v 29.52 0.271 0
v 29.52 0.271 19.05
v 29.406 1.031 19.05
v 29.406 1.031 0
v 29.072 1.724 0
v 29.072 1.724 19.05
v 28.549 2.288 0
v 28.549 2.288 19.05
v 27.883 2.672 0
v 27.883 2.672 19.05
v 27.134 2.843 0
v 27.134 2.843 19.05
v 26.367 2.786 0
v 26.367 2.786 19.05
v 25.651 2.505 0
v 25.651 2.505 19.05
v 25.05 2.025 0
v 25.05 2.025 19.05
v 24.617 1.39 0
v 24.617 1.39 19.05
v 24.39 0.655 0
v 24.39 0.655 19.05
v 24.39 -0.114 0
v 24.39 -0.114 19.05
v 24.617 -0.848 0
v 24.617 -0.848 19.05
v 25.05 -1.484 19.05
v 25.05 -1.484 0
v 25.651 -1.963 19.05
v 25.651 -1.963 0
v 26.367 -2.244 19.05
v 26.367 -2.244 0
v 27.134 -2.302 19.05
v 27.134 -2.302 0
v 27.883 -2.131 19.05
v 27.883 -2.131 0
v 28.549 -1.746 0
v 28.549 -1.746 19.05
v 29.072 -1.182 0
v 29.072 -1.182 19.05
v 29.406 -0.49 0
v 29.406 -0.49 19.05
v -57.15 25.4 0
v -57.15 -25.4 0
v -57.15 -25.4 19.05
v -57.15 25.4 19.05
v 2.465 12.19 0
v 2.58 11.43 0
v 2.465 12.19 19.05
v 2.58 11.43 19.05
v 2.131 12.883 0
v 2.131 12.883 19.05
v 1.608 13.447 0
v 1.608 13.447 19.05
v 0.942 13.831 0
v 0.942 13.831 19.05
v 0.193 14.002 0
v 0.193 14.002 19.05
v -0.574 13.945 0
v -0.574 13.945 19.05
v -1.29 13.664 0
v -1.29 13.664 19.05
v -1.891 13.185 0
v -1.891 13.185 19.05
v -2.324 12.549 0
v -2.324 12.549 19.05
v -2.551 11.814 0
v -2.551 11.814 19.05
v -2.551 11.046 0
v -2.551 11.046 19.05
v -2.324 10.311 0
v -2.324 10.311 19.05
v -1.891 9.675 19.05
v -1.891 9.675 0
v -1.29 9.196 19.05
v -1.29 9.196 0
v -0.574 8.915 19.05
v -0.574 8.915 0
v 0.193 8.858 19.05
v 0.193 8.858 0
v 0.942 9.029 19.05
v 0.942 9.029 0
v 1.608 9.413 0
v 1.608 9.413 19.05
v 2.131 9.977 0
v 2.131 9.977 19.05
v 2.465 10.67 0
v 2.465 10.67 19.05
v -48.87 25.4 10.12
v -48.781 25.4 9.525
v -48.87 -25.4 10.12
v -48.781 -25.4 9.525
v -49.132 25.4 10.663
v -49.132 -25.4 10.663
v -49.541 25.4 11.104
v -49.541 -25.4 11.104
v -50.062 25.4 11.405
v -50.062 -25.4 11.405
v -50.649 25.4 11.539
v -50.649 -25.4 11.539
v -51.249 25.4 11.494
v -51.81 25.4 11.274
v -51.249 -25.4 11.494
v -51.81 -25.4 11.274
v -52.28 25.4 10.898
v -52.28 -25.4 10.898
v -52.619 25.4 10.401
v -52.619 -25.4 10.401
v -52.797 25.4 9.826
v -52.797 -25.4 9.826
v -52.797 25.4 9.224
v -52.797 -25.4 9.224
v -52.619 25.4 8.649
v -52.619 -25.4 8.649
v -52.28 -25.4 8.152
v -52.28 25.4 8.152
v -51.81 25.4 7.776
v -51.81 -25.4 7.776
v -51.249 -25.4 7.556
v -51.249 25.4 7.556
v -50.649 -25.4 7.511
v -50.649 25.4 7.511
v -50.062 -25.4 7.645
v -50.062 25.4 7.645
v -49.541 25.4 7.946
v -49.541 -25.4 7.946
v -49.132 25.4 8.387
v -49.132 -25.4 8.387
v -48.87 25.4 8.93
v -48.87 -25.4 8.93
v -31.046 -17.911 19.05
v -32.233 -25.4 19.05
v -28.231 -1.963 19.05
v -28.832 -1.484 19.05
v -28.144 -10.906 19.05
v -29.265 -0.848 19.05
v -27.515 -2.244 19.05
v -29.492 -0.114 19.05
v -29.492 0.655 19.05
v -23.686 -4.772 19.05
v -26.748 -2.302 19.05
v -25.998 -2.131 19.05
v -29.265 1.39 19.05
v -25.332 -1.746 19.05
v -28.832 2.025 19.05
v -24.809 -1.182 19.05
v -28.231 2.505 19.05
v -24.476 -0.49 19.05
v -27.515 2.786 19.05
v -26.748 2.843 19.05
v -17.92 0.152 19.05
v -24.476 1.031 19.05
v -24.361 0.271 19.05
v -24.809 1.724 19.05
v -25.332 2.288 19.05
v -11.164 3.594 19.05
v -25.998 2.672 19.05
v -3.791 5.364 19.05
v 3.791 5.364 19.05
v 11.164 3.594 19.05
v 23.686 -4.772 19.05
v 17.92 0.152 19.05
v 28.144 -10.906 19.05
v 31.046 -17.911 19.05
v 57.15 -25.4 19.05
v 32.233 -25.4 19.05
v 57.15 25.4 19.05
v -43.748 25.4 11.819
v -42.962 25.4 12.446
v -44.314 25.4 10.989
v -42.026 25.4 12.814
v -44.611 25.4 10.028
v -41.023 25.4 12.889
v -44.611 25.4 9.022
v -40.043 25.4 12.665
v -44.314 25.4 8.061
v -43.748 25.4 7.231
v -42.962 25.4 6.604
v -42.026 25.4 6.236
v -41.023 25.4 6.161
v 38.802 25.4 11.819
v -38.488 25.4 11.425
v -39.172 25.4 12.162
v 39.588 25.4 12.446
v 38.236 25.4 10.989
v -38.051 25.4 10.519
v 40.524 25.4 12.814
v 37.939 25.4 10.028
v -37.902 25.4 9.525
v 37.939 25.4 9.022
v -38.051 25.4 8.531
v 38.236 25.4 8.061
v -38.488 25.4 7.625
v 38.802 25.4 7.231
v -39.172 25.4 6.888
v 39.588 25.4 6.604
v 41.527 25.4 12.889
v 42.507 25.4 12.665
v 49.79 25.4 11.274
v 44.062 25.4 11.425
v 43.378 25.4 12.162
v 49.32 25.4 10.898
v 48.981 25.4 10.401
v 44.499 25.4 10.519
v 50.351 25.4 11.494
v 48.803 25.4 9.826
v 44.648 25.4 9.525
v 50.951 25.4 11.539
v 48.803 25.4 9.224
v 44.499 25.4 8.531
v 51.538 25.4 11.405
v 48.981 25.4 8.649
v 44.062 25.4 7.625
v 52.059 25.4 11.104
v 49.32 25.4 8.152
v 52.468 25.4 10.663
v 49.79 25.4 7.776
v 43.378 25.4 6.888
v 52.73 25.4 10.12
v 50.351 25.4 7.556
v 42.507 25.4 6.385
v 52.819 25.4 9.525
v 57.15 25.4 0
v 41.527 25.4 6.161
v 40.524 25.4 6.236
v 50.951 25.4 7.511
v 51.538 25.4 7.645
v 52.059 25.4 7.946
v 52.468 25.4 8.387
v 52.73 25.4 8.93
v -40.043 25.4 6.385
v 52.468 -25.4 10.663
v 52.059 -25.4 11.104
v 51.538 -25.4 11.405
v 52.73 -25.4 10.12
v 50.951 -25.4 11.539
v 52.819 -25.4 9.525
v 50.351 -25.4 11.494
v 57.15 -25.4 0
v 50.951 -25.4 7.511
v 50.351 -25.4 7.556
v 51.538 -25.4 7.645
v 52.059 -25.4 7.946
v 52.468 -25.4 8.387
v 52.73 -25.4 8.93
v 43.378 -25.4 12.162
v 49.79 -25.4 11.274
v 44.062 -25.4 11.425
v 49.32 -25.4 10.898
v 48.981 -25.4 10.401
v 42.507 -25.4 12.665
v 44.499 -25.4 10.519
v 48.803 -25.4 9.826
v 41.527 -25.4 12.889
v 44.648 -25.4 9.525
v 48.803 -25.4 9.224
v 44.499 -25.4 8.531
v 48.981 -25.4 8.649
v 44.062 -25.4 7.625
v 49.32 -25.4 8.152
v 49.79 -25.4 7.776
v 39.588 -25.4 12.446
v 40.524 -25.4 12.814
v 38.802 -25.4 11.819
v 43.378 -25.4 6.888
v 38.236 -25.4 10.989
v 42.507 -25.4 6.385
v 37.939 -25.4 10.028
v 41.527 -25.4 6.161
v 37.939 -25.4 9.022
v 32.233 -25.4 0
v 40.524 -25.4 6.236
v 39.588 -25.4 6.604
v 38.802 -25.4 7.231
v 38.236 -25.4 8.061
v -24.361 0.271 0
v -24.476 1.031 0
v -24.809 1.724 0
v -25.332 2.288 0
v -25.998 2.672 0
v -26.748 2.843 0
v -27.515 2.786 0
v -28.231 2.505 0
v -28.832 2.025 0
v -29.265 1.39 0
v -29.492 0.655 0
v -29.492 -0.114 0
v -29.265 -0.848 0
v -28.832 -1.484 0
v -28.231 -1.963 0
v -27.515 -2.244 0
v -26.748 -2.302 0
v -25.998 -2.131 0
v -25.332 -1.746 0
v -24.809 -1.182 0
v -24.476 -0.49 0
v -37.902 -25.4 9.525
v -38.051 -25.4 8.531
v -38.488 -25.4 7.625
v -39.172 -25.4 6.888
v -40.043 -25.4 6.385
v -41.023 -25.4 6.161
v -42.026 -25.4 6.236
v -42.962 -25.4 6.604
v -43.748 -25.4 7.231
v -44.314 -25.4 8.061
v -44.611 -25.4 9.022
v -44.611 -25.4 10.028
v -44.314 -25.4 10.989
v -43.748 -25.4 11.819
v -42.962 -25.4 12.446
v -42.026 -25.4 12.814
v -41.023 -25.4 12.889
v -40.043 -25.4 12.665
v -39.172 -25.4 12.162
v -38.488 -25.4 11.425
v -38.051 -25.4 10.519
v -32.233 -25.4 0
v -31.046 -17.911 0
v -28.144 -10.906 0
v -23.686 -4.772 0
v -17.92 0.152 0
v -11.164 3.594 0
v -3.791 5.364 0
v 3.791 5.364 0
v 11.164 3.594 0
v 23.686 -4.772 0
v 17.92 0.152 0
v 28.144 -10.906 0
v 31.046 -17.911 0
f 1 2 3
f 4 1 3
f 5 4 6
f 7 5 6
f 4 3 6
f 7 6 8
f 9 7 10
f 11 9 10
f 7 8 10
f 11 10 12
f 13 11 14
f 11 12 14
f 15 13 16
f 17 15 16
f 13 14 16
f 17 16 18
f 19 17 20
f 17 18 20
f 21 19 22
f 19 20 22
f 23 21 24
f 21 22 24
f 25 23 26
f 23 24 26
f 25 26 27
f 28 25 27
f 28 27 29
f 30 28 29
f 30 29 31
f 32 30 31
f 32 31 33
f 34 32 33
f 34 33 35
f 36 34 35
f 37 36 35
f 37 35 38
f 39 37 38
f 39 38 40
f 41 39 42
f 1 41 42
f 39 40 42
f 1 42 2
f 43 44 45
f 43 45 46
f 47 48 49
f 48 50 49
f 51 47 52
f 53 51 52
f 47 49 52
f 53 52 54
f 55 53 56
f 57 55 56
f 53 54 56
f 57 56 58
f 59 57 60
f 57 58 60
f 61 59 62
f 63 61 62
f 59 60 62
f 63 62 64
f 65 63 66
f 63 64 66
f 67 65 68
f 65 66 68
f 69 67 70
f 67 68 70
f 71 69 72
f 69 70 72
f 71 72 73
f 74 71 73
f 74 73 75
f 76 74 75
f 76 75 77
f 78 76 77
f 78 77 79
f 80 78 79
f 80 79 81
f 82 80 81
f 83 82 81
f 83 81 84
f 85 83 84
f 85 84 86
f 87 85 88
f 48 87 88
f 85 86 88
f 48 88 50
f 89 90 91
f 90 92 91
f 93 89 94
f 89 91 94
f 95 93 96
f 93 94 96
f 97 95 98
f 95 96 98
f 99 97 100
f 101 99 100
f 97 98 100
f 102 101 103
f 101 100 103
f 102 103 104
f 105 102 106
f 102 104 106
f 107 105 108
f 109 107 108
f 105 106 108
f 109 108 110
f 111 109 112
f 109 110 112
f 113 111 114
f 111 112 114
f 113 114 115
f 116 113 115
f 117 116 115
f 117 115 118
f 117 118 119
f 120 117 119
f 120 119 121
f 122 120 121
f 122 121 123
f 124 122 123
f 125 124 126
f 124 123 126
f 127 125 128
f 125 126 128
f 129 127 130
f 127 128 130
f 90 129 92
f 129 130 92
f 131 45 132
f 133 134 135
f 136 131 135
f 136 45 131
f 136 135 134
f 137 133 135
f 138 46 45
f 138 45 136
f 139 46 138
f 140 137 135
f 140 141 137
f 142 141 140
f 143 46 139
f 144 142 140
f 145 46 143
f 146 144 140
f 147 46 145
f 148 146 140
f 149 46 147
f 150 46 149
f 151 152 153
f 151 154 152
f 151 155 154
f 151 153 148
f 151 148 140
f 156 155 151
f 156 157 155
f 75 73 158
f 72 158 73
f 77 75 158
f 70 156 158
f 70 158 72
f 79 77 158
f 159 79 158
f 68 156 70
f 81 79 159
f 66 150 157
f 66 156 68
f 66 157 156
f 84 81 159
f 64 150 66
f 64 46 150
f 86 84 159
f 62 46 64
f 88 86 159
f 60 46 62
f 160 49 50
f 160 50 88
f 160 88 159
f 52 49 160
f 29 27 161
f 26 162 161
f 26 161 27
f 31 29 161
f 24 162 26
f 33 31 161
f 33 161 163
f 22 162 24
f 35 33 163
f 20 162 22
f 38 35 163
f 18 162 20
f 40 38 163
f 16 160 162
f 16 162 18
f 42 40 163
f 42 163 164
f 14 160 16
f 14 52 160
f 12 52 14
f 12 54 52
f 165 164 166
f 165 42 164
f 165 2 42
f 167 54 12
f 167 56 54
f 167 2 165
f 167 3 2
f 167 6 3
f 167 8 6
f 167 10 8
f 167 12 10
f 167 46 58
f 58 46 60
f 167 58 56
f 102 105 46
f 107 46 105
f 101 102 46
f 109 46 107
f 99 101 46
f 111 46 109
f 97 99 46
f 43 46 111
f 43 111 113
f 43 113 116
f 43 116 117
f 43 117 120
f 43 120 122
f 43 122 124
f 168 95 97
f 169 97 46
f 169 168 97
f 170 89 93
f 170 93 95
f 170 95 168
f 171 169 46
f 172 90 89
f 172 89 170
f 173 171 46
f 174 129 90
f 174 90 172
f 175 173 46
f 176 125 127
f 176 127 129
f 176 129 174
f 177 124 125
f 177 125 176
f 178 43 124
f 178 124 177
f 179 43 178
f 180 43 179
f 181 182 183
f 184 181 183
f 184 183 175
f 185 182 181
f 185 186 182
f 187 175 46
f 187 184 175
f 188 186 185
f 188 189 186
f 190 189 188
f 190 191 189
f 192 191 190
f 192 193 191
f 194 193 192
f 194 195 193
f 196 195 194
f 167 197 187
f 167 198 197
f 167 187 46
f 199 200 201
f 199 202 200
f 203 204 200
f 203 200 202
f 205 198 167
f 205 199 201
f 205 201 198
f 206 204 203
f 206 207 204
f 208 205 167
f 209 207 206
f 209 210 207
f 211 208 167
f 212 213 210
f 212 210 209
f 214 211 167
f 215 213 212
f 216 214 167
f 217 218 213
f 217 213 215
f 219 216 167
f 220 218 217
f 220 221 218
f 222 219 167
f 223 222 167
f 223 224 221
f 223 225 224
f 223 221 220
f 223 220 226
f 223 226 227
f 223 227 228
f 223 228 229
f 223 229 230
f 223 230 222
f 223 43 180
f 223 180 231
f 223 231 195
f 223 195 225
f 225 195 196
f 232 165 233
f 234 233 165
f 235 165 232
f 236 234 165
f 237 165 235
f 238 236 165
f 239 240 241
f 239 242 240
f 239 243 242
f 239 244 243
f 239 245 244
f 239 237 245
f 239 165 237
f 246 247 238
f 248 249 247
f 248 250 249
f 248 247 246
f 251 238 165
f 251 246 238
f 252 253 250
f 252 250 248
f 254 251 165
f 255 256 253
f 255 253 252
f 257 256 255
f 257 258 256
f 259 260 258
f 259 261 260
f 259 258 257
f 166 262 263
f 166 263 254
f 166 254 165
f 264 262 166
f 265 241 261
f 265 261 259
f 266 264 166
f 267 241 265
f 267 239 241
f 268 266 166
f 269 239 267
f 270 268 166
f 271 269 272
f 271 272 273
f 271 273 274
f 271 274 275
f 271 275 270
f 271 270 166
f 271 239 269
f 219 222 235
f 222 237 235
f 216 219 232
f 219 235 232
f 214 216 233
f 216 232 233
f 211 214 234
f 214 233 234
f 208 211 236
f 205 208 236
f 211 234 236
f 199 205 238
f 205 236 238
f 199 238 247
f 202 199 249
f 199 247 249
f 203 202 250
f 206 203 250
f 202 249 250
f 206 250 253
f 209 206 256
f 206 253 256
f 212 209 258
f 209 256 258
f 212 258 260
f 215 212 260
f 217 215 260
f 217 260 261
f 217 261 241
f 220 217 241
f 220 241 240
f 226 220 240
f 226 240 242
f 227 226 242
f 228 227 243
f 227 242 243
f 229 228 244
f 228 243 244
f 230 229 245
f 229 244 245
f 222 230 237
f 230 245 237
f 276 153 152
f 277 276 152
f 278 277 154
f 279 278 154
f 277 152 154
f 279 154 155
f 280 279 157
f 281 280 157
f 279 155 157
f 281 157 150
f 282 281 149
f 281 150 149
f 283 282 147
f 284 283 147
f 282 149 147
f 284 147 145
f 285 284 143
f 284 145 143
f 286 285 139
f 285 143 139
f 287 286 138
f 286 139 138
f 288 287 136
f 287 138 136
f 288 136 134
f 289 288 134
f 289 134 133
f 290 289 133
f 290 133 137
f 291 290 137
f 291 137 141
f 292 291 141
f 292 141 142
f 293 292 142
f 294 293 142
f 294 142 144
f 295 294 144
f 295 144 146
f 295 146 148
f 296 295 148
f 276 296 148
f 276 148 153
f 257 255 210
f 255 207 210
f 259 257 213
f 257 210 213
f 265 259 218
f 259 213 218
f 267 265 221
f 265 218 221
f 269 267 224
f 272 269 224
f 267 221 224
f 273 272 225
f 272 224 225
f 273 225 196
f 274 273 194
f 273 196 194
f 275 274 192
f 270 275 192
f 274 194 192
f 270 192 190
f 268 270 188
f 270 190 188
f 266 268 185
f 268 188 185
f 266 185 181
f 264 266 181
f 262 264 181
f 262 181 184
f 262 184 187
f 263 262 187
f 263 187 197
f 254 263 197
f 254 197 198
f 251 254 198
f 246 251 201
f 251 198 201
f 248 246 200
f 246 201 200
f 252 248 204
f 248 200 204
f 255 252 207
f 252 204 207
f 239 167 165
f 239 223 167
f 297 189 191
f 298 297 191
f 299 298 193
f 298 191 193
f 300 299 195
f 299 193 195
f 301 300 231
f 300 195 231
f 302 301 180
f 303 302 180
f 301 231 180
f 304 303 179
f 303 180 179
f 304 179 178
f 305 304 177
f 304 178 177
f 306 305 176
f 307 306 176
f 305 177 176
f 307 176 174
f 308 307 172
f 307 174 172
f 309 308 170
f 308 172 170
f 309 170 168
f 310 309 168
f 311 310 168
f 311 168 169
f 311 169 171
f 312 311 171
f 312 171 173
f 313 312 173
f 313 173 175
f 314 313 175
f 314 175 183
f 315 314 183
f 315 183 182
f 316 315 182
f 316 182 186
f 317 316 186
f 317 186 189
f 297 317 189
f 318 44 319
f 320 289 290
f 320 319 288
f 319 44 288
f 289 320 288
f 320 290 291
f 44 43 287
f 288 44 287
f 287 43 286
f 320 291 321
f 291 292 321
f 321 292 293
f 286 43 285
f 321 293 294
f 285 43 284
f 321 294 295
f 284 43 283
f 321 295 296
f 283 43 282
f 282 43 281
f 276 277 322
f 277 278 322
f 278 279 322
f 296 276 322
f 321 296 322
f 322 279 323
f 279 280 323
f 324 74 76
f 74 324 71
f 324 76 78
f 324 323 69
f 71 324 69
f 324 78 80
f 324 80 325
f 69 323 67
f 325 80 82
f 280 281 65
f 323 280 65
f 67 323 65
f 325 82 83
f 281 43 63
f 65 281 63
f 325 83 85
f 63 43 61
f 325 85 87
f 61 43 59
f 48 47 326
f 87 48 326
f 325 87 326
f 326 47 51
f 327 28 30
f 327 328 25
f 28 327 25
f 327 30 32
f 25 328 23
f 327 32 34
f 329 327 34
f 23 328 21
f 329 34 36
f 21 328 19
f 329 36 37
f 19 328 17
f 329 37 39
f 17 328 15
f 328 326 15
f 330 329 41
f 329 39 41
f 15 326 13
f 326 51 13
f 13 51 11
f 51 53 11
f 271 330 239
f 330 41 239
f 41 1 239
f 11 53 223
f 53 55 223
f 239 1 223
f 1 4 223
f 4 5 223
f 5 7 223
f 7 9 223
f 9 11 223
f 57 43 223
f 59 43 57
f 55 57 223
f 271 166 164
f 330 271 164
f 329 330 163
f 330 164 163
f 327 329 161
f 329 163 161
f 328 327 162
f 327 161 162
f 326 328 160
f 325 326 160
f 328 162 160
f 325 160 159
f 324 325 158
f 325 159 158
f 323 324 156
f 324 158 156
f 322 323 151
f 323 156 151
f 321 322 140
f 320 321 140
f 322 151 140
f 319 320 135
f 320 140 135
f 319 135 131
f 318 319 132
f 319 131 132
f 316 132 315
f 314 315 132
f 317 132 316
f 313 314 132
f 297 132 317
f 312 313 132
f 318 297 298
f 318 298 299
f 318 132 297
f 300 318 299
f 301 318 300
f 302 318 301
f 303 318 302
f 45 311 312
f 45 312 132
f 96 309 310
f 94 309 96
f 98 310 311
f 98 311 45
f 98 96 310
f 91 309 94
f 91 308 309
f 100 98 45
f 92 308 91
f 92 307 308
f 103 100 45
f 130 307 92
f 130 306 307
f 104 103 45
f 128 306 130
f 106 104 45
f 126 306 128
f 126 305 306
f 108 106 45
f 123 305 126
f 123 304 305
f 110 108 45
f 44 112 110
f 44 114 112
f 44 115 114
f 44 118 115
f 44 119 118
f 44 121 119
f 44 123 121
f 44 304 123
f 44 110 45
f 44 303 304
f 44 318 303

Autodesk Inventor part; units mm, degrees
ref_plane "YZ Plane" through (0, 0, 0) normal (1, 0, 0) x (0, 1, 0)
ref_plane "XZ Plane" through (0, 0, 0) normal (0, 1, 0) x (-1, 0, 0)
ref_plane "XY Plane" through (0, 0, 0) normal (0, 0, 1) x (1, 0, 0)
sketch "Sketch1" plane through (0, 0, 0) normal (0, 0, 1) x (1, 0, 0)
  line L0 (57.15, -25.4) -> (-57.15, -25.4)
  line L1 (-57.15, -25.4) -> (-57.15, 25.4)
  line L2 (-57.15, 25.4) -> (57.15, 25.4)
  line L3 (57.15, 25.4) -> (57.15, -25.4)
  line L4 (57.15, -25.4) -> (-57.15, 25.4) construction
  line L5 (-57.15, -25.4) -> (57.15, 25.4) construction
  point P0 (0, 0)
  point P1 (0, 0)
  point P2 (0, 0)
  dimension "d0" = 114.3
  dimension "d1" = 50.8
extrude "Extrusion1" add sketch "Sketch1" along normal blind 19.05
sketch "Sketch2" plane through (0, 0, 19.05) normal (0, 0, 1) x (1, 0, 0)
  circle A0 centre (0, -26.67) radius 32.258
  line L0 (-57.15, -25.4) -> (57.15, -25.4) projected
  line L1 (-57.15, 25.4) -> (-57.15, -25.4) projected
  point P0 (0, 0)
  dimension "d4" = 64.516
  dimension "d6" = 1.27
  dimension "d48" = 57.15
extrude "Extrusion2" cut sketch "Sketch2" against normal through all
sketch "Sketch4" plane through (-57.15, 25.4, 0) normal (0, 1, 0) x (1, 0, 0)
  circle A0 centre (15.875, -9.525) radius 3.3734
  circle A1 centre (98.425, -9.525) radius 3.3734
  line L0 (114.3, 0) -> (0, 0) projected
  line L1 (57.15, -22.86) -> (57.15, 3.81) projected
  dimension "d27" = 6.7469
  dimension "d28" = 9.525
  dimension "d49" = 41.275
  dimension "d50" = 41.275
extrude "Extrusion4" cut sketch "Sketch4" against normal through all
sketch "Sketch5" plane through (-57.15, -25.4, 0) normal (0, -1, 0) x (1, 0, 0)
  circle A0 centre (6.35, 9.525) radius 2.0193
  circle A1 centre (107.95, 9.525) radius 2.0193
  line L0 (0, 0) -> (24.917, 0) projected
  line L1 (57.15, 22.86) -> (57.15, -3.81) projected
  dimension "d33" = 9.525
  dimension "d34" = 4.0386
  dimension "d51" = 50.8
  dimension "d52" = 50.8
extrude "Extrusion5" cut sketch "Sketch5" against normal through all
sketch "Sketch6" plane through (0, 0, 19.05) normal (0, 0, 1) x (1, 0, 0)
  circle A0 centre (-26.9408, 0.2708) radius 2.5797
  arc A1 (32.233, -25.4) -> (-32.233, -25.4) centre (0, -26.67) ccw projected
  circle A2 centre (0, 11.43) radius 2.5797
  circle A3 centre (26.9408, 0.2708) radius 2.5797
  line L0 (0, -26.67) -> (0, -14.487)
  dimension "d39" = 38.1
  dimension "d40" = 5.1594
  dimension "d44" = 90
  dimension "d53" = 45
extrude "Extrusion6" cut sketch "Sketch6" against normal through all
equation "\"d50\" = d49"
equation "\"d52\" = d51"
properties part number "ShooterSeperableClampA"
